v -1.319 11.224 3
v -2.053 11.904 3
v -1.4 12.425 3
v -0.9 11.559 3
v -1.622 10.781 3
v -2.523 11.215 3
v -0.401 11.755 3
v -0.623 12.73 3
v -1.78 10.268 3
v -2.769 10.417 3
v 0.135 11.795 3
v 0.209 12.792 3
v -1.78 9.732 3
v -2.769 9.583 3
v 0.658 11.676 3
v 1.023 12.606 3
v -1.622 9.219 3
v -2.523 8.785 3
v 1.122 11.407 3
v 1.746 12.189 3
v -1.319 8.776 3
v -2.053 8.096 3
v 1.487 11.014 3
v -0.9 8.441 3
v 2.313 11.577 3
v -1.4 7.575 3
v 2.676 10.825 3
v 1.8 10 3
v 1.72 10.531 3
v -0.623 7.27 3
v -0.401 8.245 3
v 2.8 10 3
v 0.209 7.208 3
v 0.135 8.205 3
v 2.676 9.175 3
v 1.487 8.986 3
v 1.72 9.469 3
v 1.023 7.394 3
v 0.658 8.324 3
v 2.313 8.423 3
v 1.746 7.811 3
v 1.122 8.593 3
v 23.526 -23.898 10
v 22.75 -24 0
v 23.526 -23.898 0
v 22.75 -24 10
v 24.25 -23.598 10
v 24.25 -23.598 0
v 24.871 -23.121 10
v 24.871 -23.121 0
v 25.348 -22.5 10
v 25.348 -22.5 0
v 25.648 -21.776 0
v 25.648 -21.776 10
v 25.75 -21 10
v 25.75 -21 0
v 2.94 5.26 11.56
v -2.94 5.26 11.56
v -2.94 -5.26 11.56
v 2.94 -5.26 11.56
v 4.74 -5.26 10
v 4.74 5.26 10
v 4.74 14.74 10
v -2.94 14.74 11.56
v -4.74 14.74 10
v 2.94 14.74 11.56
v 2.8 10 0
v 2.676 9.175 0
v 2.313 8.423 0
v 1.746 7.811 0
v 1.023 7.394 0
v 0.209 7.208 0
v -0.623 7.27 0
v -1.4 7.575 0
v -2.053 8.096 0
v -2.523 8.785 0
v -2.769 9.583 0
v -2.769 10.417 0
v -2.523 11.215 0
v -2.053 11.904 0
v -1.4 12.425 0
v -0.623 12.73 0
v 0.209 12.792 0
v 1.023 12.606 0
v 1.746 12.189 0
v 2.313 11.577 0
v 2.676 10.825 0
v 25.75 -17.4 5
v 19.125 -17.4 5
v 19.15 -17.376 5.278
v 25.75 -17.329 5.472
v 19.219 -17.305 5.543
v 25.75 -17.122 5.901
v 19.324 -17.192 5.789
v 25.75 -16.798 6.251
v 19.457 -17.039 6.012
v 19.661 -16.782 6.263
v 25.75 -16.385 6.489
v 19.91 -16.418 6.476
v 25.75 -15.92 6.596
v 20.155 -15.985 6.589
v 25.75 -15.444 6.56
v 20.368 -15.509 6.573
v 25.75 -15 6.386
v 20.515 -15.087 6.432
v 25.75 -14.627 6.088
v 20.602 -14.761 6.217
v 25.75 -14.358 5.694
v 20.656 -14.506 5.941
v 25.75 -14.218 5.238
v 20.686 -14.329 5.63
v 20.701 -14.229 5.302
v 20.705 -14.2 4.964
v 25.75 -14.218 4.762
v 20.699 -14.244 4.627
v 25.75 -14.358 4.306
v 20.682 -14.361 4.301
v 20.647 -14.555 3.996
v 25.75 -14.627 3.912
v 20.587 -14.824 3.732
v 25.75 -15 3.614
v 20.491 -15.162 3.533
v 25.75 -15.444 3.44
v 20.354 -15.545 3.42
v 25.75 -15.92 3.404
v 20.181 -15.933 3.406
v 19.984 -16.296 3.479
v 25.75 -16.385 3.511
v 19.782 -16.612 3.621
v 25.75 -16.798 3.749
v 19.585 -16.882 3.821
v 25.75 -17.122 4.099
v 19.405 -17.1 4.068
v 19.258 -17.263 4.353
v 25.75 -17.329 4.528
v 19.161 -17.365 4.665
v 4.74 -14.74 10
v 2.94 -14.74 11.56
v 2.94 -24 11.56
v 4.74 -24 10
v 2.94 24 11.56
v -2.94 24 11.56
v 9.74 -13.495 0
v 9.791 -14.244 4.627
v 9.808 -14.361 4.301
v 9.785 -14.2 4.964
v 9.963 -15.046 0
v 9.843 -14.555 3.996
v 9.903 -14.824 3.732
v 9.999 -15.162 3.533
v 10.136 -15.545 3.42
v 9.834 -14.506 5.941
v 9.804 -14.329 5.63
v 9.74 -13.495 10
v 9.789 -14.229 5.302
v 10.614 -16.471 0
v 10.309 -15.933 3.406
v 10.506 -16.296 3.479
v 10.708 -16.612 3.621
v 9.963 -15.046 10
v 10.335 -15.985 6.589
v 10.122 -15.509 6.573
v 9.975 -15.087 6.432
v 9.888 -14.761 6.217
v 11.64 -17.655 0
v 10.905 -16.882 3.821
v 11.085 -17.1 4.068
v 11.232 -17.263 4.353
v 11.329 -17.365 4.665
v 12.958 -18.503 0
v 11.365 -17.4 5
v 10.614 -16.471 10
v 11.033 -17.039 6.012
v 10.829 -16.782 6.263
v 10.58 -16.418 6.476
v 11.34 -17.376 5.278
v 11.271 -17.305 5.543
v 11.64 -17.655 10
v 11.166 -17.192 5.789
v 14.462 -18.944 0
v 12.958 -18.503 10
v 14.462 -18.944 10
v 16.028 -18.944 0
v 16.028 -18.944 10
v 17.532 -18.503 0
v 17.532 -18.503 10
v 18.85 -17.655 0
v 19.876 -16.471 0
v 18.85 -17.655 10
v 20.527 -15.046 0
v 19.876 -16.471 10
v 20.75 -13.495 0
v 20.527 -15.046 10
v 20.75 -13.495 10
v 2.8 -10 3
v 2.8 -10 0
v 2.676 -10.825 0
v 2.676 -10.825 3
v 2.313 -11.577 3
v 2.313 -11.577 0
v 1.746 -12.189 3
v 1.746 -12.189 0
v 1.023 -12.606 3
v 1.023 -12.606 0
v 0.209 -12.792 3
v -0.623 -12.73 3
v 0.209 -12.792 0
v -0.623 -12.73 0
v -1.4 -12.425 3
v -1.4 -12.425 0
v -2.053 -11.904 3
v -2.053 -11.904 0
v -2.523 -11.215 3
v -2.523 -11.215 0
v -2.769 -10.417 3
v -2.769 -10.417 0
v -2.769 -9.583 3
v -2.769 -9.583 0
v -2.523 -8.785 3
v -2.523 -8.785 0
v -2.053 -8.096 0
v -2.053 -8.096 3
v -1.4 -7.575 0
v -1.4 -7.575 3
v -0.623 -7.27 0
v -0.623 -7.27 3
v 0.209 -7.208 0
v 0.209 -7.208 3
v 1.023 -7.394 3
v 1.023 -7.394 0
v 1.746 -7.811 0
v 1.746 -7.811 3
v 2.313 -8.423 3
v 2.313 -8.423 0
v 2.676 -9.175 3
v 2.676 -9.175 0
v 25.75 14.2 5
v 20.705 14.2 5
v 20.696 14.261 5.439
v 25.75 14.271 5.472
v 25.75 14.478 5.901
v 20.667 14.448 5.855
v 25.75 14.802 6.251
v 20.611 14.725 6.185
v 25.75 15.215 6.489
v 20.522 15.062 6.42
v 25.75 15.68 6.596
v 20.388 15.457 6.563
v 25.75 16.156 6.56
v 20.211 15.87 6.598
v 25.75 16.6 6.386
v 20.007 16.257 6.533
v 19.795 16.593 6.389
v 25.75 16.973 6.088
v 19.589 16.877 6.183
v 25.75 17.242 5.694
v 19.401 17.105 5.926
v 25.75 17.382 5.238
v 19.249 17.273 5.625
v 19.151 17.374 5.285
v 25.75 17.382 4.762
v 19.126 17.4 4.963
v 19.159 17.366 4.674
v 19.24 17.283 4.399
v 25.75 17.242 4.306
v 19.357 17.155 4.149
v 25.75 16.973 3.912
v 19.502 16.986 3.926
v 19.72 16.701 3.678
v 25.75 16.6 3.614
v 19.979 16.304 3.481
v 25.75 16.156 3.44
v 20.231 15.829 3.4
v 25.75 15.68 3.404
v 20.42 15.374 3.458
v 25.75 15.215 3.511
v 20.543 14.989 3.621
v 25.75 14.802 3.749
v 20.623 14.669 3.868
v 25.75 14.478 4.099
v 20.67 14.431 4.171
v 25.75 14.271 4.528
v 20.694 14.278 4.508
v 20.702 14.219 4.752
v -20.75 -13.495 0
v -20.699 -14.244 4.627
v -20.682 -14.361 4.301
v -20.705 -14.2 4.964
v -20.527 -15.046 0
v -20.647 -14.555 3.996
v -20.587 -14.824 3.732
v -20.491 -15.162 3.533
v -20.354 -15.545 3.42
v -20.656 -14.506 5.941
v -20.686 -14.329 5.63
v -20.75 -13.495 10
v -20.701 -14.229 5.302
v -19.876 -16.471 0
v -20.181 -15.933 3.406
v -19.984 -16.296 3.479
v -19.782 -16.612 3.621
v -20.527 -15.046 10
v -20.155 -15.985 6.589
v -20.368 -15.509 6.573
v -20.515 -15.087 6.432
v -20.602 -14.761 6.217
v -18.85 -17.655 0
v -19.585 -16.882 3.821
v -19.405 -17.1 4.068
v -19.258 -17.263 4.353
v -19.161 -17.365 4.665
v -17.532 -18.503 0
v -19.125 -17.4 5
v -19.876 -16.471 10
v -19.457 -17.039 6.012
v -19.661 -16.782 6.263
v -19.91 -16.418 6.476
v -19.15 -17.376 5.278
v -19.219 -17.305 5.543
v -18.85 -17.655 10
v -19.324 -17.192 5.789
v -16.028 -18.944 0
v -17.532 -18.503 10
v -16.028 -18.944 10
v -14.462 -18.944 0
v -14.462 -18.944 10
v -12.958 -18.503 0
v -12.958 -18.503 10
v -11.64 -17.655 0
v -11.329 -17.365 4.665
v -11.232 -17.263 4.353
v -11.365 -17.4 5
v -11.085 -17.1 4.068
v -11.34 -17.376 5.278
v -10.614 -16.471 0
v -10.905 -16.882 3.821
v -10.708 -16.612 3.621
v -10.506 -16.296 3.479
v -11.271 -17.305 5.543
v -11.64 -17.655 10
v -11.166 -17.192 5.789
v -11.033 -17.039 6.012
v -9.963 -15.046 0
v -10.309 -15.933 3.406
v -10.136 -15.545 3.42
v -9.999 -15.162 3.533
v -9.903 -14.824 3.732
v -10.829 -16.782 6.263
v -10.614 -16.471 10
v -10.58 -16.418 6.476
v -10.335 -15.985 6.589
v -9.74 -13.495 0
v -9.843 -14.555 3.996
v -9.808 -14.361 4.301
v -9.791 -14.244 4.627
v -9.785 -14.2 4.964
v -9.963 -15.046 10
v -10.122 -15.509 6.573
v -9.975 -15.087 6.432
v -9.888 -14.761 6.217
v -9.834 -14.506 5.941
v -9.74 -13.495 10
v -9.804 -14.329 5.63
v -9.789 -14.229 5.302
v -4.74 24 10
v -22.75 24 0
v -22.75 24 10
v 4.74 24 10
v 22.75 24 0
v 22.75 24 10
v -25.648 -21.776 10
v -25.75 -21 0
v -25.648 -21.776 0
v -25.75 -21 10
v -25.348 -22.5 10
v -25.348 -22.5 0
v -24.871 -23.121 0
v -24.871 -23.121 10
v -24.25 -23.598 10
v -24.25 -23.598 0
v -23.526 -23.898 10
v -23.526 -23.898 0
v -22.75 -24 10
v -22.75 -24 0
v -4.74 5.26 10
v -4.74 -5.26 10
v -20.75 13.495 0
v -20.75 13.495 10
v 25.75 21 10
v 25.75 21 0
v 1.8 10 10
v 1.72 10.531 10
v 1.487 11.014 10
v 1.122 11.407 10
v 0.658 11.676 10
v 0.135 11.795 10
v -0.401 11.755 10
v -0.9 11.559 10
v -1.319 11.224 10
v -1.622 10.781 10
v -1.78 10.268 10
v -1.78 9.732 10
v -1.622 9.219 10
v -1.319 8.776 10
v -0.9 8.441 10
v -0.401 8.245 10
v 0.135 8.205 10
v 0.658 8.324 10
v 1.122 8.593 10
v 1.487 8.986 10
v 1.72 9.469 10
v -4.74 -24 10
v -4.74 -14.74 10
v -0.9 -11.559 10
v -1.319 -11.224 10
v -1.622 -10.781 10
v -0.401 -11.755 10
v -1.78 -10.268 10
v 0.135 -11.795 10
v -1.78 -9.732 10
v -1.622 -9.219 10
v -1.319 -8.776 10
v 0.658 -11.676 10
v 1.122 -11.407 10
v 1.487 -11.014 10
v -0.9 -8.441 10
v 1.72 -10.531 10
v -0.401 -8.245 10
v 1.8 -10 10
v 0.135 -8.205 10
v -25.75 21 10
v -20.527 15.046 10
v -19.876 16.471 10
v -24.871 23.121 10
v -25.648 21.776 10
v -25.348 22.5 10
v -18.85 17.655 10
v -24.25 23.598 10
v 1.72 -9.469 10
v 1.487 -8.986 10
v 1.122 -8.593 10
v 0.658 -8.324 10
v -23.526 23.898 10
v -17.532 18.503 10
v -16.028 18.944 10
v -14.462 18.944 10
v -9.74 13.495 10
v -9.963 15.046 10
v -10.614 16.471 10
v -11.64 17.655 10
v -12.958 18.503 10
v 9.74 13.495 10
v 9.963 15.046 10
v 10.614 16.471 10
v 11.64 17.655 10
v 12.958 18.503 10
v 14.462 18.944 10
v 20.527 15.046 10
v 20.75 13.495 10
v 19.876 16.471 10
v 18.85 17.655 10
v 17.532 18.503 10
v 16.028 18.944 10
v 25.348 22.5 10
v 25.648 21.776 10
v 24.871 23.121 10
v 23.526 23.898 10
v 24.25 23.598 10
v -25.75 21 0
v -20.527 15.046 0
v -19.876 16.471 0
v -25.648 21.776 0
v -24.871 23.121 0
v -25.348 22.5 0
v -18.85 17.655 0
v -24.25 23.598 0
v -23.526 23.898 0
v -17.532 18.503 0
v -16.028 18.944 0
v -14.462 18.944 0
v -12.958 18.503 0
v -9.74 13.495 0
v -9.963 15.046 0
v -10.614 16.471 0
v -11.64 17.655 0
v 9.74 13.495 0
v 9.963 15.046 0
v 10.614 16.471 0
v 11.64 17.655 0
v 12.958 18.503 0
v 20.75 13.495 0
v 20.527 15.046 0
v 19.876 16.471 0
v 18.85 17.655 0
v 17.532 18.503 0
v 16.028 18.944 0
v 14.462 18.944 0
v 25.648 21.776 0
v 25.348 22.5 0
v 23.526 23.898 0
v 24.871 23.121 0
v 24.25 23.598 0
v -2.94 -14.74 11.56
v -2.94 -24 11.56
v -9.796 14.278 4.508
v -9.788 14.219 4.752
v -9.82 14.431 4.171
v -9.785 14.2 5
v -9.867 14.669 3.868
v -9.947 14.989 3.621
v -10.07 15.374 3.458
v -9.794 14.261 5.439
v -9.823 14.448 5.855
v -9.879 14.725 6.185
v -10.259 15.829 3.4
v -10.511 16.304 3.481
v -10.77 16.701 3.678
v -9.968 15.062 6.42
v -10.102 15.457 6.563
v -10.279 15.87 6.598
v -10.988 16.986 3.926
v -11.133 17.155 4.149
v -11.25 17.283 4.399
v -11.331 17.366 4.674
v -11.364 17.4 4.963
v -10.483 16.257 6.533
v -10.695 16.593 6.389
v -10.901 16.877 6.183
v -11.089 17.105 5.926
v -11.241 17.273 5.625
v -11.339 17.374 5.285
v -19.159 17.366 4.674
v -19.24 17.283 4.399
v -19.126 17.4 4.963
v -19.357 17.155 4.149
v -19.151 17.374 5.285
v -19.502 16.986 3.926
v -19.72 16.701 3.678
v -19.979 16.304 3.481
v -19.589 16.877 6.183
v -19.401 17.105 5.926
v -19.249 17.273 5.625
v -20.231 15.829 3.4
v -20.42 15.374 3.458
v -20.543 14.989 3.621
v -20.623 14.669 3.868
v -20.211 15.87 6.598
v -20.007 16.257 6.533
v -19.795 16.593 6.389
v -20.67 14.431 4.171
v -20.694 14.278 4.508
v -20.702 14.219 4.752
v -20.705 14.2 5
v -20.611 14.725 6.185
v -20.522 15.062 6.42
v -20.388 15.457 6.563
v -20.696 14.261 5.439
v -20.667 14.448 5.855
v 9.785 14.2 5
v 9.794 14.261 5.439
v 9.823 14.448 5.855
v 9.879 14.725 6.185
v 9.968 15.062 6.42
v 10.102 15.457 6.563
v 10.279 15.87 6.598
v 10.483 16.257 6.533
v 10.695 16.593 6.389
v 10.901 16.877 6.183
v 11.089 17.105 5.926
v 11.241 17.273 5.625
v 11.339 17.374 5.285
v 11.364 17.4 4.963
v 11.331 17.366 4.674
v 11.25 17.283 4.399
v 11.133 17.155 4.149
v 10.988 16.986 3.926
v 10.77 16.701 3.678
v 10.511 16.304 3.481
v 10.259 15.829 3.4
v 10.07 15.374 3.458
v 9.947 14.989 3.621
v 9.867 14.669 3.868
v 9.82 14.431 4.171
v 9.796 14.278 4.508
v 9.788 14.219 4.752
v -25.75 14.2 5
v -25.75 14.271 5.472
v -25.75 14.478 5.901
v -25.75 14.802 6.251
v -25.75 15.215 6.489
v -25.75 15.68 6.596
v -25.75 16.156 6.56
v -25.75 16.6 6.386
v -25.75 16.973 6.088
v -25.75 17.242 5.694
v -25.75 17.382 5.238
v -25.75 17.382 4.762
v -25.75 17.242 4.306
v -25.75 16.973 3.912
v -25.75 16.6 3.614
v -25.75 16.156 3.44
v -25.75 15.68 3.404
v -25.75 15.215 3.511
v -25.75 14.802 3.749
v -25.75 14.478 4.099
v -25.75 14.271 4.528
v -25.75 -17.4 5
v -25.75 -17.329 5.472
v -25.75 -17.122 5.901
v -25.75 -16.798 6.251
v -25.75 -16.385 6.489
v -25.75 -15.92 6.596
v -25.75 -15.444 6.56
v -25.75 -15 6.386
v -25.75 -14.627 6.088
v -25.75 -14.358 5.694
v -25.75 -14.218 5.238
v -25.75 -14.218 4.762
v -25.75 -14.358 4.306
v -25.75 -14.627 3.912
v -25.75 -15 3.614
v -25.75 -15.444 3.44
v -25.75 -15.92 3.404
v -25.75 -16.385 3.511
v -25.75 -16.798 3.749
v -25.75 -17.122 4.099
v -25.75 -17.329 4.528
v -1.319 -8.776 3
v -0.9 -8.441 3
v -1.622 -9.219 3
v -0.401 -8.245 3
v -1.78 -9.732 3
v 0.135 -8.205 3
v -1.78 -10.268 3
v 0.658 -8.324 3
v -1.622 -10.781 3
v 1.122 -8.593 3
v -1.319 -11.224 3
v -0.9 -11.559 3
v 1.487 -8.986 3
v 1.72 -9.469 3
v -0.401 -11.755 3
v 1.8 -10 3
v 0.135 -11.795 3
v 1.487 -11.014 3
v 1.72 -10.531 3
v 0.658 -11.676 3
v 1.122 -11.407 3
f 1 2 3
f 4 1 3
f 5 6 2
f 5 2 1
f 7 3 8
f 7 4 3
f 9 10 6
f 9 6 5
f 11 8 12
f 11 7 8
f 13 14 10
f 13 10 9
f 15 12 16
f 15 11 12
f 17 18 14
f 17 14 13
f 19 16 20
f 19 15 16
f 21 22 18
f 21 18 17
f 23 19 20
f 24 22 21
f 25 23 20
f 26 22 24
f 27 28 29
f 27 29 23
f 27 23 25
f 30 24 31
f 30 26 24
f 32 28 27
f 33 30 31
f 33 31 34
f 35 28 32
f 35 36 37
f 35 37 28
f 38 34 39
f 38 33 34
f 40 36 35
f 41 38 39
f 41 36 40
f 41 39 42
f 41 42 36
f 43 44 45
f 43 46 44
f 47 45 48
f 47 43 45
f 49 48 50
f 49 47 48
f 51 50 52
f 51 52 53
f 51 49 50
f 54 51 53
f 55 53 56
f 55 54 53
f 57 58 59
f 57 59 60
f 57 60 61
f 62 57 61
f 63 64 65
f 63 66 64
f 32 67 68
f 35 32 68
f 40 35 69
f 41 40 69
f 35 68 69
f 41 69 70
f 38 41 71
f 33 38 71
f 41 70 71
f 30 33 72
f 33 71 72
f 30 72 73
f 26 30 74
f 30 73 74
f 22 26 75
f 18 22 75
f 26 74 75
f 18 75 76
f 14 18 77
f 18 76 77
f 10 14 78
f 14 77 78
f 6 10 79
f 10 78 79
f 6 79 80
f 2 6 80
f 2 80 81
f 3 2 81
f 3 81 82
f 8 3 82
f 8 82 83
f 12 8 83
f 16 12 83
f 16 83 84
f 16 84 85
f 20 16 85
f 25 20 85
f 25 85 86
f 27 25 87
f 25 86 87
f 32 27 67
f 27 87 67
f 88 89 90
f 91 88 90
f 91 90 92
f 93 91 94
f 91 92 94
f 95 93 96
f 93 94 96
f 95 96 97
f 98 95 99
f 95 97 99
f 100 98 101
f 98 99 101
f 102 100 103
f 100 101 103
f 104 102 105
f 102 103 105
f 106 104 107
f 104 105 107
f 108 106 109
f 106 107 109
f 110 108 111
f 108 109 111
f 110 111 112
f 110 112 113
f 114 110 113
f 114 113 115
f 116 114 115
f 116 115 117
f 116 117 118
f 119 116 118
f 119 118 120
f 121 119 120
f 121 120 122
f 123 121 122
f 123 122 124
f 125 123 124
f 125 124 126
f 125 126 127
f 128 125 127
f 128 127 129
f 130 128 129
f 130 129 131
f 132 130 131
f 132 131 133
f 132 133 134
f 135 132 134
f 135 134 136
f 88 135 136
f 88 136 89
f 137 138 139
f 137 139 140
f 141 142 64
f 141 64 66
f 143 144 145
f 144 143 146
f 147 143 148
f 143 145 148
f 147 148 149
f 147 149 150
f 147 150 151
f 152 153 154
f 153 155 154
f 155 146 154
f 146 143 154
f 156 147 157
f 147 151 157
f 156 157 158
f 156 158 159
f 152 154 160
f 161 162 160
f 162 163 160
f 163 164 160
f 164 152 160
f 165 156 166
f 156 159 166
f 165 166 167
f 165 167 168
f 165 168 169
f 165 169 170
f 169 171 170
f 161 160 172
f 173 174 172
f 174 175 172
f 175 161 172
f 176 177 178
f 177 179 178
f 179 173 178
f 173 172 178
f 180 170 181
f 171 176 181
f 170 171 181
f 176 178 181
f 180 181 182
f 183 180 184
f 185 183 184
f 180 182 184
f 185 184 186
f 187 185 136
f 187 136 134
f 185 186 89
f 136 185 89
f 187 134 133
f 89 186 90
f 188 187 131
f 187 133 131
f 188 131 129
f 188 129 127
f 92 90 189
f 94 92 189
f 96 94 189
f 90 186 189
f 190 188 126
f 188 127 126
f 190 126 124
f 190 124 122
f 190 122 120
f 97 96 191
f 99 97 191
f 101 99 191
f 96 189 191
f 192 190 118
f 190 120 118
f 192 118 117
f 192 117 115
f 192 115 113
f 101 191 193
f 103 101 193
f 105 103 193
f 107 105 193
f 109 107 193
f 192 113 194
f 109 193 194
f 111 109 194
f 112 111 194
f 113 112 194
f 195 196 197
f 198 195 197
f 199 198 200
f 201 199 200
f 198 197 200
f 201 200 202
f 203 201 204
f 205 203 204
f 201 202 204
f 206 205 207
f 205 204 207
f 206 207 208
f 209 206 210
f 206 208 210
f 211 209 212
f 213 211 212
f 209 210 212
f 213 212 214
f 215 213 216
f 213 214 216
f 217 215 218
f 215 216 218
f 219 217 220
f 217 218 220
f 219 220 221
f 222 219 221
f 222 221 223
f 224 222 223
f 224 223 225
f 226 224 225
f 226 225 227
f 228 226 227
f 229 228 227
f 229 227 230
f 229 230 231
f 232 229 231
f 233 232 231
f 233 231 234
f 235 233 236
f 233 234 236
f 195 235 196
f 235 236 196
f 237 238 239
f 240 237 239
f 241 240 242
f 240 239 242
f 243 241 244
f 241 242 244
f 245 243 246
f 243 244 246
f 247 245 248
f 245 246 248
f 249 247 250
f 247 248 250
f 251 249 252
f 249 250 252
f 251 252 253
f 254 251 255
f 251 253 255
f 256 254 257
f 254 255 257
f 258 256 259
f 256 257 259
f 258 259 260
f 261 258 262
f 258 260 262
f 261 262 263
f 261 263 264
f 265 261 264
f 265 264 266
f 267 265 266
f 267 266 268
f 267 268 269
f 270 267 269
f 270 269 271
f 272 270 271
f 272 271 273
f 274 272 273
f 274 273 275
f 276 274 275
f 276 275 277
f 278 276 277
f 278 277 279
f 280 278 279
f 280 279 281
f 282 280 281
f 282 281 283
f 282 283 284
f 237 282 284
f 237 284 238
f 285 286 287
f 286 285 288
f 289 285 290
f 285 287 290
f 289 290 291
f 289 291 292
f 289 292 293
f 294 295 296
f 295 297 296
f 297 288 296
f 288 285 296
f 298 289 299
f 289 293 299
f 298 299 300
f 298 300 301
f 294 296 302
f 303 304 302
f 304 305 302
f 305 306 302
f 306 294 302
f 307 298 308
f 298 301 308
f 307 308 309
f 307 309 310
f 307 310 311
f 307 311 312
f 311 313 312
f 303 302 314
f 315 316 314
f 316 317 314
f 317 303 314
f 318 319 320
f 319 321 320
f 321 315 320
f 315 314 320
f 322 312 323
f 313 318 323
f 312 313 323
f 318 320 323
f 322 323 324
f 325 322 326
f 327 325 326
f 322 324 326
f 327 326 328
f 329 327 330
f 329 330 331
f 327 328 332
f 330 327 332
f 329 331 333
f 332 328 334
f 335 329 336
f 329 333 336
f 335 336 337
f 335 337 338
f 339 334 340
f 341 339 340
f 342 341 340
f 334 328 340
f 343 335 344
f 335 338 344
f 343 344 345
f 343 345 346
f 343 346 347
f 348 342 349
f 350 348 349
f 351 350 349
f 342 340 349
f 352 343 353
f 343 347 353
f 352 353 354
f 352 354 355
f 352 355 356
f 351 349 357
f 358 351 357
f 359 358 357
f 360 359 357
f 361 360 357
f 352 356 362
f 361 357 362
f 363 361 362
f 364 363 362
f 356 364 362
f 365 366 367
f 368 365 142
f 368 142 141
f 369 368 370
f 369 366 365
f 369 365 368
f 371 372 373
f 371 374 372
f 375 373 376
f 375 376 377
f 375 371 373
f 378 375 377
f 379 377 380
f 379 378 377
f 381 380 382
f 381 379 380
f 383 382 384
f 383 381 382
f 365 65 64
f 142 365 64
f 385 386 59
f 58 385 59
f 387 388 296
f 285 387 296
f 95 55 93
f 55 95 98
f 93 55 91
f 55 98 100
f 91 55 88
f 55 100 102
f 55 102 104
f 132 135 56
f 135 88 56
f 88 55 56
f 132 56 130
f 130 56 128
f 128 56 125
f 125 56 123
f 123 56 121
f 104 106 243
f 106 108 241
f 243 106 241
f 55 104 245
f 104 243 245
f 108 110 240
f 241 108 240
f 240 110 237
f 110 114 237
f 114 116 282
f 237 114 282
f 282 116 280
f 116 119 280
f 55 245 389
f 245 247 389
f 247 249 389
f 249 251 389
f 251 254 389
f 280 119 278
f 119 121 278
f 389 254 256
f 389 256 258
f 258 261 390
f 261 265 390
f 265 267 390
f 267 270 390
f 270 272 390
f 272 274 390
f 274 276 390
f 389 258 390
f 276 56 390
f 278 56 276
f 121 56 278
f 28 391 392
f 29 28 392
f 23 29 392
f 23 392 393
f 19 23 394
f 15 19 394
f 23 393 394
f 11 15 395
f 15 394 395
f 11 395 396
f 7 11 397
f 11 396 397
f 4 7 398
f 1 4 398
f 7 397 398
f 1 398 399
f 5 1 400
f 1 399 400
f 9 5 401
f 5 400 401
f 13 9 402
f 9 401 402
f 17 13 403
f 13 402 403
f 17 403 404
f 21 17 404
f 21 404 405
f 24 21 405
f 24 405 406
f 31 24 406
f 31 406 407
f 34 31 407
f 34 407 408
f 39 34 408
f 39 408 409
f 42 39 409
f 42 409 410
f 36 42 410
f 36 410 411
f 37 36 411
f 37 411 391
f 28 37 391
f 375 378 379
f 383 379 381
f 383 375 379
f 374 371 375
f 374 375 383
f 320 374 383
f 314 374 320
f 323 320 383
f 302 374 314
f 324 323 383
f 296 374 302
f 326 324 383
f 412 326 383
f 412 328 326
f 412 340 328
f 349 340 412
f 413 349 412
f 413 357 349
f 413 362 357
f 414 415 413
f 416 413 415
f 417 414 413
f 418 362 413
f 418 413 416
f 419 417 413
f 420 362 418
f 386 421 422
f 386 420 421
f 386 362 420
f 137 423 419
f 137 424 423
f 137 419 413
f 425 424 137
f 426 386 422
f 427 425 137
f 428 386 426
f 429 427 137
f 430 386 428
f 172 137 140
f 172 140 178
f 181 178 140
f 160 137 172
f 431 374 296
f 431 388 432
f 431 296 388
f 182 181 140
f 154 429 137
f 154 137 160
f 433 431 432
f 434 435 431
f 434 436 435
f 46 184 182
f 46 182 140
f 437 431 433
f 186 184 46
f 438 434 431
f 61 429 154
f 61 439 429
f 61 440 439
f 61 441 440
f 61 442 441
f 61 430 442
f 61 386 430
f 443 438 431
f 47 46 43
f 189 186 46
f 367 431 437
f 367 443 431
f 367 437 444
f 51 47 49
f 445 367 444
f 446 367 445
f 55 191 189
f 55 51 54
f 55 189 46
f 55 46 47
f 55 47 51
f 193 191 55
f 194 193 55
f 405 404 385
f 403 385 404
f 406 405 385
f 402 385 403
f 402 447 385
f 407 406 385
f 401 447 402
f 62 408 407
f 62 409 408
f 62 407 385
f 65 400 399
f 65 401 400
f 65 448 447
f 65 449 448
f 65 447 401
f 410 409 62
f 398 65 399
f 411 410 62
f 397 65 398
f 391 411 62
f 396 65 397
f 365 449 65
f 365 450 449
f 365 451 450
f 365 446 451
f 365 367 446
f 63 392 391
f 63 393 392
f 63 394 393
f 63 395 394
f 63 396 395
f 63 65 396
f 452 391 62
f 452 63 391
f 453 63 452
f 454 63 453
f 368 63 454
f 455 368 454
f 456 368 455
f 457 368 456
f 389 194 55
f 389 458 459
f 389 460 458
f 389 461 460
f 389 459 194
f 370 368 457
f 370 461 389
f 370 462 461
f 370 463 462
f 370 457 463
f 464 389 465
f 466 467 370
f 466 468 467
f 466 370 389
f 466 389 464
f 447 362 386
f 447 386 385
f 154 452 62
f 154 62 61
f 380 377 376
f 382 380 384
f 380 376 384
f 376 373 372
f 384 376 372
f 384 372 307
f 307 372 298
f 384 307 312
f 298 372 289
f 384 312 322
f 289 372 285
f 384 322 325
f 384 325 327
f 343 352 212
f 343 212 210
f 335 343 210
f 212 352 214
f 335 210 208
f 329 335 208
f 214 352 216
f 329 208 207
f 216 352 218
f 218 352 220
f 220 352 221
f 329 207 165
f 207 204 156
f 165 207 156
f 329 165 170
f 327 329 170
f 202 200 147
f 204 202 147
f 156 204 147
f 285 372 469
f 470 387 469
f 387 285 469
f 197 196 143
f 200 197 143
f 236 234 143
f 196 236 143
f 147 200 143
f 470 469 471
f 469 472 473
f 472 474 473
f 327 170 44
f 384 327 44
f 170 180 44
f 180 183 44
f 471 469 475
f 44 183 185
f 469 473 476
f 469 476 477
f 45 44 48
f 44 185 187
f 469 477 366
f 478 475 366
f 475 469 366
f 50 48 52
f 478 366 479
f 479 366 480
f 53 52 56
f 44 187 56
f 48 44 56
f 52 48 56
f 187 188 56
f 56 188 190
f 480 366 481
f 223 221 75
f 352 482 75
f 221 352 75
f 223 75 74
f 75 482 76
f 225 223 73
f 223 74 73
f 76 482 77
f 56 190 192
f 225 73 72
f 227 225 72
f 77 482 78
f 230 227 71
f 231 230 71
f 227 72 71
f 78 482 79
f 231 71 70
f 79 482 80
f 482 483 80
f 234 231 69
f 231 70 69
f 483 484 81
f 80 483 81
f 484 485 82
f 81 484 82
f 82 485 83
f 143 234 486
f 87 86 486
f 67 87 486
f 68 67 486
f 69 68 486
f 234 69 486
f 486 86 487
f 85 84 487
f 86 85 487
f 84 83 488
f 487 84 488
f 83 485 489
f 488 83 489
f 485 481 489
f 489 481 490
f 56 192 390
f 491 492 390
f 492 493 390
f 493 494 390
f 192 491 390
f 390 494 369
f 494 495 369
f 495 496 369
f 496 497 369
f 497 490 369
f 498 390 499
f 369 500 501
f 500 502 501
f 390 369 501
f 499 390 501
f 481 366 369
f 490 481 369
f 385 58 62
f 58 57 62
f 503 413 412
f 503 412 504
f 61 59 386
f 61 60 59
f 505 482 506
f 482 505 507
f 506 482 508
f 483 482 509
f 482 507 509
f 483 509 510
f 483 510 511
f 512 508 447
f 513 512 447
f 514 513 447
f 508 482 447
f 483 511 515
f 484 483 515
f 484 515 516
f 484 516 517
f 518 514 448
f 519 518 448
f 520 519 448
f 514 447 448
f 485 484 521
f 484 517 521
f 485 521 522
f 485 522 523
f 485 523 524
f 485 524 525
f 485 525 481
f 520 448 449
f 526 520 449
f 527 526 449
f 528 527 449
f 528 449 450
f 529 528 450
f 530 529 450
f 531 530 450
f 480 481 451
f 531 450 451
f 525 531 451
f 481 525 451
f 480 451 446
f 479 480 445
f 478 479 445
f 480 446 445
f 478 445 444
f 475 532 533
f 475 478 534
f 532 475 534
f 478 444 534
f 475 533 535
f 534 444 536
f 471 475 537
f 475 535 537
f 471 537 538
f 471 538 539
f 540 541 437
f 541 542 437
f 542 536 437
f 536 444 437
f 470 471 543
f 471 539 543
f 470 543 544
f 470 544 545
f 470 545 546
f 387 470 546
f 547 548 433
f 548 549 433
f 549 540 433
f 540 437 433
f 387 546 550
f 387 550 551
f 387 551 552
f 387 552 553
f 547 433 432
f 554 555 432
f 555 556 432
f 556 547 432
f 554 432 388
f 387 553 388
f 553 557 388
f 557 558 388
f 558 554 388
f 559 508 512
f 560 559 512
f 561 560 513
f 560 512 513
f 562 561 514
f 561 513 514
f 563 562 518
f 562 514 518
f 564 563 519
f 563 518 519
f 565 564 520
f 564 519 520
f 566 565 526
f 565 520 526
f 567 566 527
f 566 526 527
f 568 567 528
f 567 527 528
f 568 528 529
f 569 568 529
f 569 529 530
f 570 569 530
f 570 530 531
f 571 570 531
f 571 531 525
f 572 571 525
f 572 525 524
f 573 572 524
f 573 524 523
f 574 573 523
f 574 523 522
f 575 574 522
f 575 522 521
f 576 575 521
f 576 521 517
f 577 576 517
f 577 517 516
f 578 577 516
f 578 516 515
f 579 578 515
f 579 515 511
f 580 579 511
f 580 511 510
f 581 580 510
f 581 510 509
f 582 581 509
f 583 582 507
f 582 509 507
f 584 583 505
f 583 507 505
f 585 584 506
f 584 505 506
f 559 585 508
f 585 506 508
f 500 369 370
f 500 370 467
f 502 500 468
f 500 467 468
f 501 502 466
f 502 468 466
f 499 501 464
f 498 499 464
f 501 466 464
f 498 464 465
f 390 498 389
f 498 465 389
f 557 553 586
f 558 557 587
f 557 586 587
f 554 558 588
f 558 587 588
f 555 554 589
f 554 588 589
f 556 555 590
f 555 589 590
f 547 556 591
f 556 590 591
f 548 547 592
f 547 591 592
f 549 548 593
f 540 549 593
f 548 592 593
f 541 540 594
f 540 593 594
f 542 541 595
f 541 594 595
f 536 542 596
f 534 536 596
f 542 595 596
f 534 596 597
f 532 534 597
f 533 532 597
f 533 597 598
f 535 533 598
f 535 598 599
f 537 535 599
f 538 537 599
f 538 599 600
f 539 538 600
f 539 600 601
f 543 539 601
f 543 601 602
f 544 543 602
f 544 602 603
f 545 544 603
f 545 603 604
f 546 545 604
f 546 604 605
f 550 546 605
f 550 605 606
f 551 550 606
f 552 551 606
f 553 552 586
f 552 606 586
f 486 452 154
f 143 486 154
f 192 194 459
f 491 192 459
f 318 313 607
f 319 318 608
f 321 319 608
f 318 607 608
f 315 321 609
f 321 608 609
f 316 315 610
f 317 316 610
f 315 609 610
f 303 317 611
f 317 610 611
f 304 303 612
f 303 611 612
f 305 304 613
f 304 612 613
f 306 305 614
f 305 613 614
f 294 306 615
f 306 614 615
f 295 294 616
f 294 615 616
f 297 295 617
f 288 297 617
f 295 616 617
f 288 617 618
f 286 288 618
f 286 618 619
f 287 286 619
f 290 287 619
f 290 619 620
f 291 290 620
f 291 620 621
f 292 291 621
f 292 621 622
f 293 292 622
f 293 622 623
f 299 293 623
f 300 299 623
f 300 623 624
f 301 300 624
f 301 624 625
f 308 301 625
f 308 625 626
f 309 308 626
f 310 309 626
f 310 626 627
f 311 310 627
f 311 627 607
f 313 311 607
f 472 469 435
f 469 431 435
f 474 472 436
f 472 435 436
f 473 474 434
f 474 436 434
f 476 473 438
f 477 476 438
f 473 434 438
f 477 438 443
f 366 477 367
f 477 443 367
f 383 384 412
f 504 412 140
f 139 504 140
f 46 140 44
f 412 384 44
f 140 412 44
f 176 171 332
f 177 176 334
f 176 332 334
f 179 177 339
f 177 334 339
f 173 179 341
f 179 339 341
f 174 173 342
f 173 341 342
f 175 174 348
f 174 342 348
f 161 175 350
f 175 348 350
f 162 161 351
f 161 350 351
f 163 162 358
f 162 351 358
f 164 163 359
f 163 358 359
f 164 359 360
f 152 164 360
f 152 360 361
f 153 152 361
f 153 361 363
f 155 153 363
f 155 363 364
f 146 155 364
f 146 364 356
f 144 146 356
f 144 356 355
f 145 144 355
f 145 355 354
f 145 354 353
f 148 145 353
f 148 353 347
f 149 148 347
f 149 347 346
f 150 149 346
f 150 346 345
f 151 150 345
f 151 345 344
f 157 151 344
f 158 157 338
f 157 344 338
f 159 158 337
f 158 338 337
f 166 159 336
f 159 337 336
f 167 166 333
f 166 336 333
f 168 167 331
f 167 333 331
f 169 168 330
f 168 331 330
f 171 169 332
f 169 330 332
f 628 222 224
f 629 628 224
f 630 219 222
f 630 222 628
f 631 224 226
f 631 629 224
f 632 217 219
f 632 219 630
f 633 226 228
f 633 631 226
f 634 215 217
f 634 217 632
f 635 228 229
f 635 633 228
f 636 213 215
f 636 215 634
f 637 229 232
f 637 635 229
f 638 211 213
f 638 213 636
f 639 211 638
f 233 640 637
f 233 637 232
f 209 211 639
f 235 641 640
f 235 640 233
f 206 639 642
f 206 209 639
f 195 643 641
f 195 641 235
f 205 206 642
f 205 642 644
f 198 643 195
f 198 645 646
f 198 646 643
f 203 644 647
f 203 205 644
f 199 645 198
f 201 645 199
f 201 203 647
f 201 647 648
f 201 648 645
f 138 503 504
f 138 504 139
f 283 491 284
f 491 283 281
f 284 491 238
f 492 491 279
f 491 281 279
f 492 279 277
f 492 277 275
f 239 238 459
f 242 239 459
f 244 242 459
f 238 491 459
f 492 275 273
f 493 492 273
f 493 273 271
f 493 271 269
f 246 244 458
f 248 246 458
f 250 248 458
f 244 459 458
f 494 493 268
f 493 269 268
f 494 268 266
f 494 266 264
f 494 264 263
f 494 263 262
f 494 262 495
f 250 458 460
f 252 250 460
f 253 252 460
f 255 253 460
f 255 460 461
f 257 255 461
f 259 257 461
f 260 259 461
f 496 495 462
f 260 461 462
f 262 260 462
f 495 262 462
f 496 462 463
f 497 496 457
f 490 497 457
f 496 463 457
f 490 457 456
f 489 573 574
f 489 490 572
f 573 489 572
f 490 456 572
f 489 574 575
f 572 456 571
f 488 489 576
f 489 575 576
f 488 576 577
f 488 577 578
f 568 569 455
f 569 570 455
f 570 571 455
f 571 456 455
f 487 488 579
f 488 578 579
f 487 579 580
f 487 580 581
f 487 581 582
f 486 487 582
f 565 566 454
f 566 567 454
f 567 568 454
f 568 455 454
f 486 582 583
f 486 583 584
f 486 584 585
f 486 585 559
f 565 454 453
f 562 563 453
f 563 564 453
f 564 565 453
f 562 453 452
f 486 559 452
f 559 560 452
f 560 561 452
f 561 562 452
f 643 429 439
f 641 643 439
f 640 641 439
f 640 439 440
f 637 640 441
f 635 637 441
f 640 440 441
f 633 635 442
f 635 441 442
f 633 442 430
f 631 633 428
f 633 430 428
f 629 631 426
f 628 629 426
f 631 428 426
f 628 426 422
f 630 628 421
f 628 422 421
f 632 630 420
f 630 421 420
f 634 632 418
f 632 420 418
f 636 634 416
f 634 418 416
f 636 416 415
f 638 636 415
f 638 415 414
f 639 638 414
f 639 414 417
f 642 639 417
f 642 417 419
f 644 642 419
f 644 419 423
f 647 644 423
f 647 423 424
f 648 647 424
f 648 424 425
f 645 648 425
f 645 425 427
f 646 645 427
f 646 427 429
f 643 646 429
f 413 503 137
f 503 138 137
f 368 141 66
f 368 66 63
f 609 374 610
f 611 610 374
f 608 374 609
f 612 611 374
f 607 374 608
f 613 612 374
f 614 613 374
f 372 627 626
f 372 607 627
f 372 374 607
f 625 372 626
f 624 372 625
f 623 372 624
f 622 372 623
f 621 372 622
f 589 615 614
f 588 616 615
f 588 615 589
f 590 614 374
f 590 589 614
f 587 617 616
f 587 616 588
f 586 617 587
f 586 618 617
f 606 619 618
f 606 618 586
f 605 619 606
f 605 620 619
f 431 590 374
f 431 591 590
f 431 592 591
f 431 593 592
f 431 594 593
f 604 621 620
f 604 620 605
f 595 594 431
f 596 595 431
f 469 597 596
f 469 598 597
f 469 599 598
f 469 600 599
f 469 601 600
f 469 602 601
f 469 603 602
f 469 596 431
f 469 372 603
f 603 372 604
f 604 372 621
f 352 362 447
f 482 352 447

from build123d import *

# Parameters (mm, degrees)
SKETCH_W        = 51.5
SKETCH_H        = 48
PAD_DEPTH       = 10
SKETCH001_R     = 1.6
POCKET_DEPTH    = 51.501
FILLET_R        = 3
PAD001_DEPTH    = 48
SKETCH003_R     = 1.8
POCKET001_DEPTH = 11.561
SKETCH004_R     = 2.8
POCKET002_DEPTH = 3
SKETCH005_W     = 9.48
SKETCH005_H     = 9.48
POCKET003_DEPTH = 1.56
POCKET004_DEPTH = 10.001


with BuildPart() as part:
    # Sketch → Pad (new body)
    with BuildSketch(Plane.XY):
        Rectangle(SKETCH_W, SKETCH_H)
    extrude(amount=PAD_DEPTH)

    # Sketch001 (on Face4 of Pad) → Pocket (cut, through all)
    with BuildSketch(Plane(origin=(-25.75, 0, 0), x_dir=(0, -1, 0), z_dir=(-1, 0, 0))):
        with Locations((-15.8, 5)):
            Circle(SKETCH001_R)
        with Locations((15.8, 5)):
            Circle(SKETCH001_R)
    extrude(amount=-POCKET_DEPTH, mode=Mode.SUBTRACT)

    # Fillet
    fillet_edges = [part.edges().sort_by_distance(p)[0] for p in [
        (25.75, -24, 5),
        (25.75, 24, 5),
        (-25.75, 24, 5),
        (-25.75, -24, 5),
    ]]
    fillet(fillet_edges, radius=FILLET_R)

    # Sketch002 (on Face1 of Fillet) → Pad001 (join)
    with BuildSketch(Plane(origin=(0, 24, 0), x_dir=(-1, 0, 0), z_dir=(0, 1, 0))):
        Polygon((2.94, 11.56), (-2.94, 11.56), (-4.74, 10), (4.74, 10), align=None)
    extrude(amount=-PAD001_DEPTH)

    # Sketch003 (on Face14 of Pad001) → Pocket001 (cut, through all)
    with BuildSketch(Plane.XY.offset(11.56)):
        with Locations((0, 10)):
            Circle(SKETCH003_R)
        with Locations((0, -10)):
            Circle(SKETCH003_R)
    extrude(amount=-POCKET001_DEPTH, mode=Mode.SUBTRACT)

    # Sketch004 (on Face2 of Pocket001) → Pocket002 (cut)
    with BuildSketch(Plane(origin=(0, 0, 0), x_dir=(1, 0, 0), z_dir=(0, 0, -1))):
        with Locations((0, 10)):
            Circle(SKETCH004_R)
        with Locations((0, -10)):
            Circle(SKETCH004_R)
    extrude(amount=-POCKET002_DEPTH, mode=Mode.SUBTRACT)

    # Sketch005 (on Face16 of Pocket002) → Pocket003 (cut)
    with BuildSketch(Plane.XY.offset(11.56)):
        with Locations((0, 10)):
            Rectangle(SKETCH005_W, SKETCH005_H)
        with Locations((0, -10)):
            Rectangle(SKETCH005_W, SKETCH005_H)
    extrude(amount=-POCKET003_DEPTH, mode=Mode.SUBTRACT)

    # Sketch006 (on Face5 of Pocket003) → Pocket004 (cut, through all)
    with BuildSketch(Plane.XY.offset(10)):
        with BuildLine():
            ThreePointArc((-9.74, 13.495), (-15.245, 19), (-20.75, 13.495))
            Line((-20.75, 13.495), (-20.75, -13.495))
            ThreePointArc((-20.75, -13.495), (-15.245, -19), (-9.74, -13.495))
            Line((-9.74, -13.495), (-9.74, 13.495))
        make_face()
        with BuildLine():
            ThreePointArc((20.75, 13.495), (15.245, 19), (9.74, 13.495))
            Line((9.74, 13.495), (9.74, -13.495))
            ThreePointArc((9.74, -13.495), (15.245, -19), (20.75, -13.495))
            Line((20.75, -13.495), (20.75, 13.495))
        make_face()
    extrude(amount=-POCKET004_DEPTH, mode=Mode.SUBTRACT)


solid = part.part
